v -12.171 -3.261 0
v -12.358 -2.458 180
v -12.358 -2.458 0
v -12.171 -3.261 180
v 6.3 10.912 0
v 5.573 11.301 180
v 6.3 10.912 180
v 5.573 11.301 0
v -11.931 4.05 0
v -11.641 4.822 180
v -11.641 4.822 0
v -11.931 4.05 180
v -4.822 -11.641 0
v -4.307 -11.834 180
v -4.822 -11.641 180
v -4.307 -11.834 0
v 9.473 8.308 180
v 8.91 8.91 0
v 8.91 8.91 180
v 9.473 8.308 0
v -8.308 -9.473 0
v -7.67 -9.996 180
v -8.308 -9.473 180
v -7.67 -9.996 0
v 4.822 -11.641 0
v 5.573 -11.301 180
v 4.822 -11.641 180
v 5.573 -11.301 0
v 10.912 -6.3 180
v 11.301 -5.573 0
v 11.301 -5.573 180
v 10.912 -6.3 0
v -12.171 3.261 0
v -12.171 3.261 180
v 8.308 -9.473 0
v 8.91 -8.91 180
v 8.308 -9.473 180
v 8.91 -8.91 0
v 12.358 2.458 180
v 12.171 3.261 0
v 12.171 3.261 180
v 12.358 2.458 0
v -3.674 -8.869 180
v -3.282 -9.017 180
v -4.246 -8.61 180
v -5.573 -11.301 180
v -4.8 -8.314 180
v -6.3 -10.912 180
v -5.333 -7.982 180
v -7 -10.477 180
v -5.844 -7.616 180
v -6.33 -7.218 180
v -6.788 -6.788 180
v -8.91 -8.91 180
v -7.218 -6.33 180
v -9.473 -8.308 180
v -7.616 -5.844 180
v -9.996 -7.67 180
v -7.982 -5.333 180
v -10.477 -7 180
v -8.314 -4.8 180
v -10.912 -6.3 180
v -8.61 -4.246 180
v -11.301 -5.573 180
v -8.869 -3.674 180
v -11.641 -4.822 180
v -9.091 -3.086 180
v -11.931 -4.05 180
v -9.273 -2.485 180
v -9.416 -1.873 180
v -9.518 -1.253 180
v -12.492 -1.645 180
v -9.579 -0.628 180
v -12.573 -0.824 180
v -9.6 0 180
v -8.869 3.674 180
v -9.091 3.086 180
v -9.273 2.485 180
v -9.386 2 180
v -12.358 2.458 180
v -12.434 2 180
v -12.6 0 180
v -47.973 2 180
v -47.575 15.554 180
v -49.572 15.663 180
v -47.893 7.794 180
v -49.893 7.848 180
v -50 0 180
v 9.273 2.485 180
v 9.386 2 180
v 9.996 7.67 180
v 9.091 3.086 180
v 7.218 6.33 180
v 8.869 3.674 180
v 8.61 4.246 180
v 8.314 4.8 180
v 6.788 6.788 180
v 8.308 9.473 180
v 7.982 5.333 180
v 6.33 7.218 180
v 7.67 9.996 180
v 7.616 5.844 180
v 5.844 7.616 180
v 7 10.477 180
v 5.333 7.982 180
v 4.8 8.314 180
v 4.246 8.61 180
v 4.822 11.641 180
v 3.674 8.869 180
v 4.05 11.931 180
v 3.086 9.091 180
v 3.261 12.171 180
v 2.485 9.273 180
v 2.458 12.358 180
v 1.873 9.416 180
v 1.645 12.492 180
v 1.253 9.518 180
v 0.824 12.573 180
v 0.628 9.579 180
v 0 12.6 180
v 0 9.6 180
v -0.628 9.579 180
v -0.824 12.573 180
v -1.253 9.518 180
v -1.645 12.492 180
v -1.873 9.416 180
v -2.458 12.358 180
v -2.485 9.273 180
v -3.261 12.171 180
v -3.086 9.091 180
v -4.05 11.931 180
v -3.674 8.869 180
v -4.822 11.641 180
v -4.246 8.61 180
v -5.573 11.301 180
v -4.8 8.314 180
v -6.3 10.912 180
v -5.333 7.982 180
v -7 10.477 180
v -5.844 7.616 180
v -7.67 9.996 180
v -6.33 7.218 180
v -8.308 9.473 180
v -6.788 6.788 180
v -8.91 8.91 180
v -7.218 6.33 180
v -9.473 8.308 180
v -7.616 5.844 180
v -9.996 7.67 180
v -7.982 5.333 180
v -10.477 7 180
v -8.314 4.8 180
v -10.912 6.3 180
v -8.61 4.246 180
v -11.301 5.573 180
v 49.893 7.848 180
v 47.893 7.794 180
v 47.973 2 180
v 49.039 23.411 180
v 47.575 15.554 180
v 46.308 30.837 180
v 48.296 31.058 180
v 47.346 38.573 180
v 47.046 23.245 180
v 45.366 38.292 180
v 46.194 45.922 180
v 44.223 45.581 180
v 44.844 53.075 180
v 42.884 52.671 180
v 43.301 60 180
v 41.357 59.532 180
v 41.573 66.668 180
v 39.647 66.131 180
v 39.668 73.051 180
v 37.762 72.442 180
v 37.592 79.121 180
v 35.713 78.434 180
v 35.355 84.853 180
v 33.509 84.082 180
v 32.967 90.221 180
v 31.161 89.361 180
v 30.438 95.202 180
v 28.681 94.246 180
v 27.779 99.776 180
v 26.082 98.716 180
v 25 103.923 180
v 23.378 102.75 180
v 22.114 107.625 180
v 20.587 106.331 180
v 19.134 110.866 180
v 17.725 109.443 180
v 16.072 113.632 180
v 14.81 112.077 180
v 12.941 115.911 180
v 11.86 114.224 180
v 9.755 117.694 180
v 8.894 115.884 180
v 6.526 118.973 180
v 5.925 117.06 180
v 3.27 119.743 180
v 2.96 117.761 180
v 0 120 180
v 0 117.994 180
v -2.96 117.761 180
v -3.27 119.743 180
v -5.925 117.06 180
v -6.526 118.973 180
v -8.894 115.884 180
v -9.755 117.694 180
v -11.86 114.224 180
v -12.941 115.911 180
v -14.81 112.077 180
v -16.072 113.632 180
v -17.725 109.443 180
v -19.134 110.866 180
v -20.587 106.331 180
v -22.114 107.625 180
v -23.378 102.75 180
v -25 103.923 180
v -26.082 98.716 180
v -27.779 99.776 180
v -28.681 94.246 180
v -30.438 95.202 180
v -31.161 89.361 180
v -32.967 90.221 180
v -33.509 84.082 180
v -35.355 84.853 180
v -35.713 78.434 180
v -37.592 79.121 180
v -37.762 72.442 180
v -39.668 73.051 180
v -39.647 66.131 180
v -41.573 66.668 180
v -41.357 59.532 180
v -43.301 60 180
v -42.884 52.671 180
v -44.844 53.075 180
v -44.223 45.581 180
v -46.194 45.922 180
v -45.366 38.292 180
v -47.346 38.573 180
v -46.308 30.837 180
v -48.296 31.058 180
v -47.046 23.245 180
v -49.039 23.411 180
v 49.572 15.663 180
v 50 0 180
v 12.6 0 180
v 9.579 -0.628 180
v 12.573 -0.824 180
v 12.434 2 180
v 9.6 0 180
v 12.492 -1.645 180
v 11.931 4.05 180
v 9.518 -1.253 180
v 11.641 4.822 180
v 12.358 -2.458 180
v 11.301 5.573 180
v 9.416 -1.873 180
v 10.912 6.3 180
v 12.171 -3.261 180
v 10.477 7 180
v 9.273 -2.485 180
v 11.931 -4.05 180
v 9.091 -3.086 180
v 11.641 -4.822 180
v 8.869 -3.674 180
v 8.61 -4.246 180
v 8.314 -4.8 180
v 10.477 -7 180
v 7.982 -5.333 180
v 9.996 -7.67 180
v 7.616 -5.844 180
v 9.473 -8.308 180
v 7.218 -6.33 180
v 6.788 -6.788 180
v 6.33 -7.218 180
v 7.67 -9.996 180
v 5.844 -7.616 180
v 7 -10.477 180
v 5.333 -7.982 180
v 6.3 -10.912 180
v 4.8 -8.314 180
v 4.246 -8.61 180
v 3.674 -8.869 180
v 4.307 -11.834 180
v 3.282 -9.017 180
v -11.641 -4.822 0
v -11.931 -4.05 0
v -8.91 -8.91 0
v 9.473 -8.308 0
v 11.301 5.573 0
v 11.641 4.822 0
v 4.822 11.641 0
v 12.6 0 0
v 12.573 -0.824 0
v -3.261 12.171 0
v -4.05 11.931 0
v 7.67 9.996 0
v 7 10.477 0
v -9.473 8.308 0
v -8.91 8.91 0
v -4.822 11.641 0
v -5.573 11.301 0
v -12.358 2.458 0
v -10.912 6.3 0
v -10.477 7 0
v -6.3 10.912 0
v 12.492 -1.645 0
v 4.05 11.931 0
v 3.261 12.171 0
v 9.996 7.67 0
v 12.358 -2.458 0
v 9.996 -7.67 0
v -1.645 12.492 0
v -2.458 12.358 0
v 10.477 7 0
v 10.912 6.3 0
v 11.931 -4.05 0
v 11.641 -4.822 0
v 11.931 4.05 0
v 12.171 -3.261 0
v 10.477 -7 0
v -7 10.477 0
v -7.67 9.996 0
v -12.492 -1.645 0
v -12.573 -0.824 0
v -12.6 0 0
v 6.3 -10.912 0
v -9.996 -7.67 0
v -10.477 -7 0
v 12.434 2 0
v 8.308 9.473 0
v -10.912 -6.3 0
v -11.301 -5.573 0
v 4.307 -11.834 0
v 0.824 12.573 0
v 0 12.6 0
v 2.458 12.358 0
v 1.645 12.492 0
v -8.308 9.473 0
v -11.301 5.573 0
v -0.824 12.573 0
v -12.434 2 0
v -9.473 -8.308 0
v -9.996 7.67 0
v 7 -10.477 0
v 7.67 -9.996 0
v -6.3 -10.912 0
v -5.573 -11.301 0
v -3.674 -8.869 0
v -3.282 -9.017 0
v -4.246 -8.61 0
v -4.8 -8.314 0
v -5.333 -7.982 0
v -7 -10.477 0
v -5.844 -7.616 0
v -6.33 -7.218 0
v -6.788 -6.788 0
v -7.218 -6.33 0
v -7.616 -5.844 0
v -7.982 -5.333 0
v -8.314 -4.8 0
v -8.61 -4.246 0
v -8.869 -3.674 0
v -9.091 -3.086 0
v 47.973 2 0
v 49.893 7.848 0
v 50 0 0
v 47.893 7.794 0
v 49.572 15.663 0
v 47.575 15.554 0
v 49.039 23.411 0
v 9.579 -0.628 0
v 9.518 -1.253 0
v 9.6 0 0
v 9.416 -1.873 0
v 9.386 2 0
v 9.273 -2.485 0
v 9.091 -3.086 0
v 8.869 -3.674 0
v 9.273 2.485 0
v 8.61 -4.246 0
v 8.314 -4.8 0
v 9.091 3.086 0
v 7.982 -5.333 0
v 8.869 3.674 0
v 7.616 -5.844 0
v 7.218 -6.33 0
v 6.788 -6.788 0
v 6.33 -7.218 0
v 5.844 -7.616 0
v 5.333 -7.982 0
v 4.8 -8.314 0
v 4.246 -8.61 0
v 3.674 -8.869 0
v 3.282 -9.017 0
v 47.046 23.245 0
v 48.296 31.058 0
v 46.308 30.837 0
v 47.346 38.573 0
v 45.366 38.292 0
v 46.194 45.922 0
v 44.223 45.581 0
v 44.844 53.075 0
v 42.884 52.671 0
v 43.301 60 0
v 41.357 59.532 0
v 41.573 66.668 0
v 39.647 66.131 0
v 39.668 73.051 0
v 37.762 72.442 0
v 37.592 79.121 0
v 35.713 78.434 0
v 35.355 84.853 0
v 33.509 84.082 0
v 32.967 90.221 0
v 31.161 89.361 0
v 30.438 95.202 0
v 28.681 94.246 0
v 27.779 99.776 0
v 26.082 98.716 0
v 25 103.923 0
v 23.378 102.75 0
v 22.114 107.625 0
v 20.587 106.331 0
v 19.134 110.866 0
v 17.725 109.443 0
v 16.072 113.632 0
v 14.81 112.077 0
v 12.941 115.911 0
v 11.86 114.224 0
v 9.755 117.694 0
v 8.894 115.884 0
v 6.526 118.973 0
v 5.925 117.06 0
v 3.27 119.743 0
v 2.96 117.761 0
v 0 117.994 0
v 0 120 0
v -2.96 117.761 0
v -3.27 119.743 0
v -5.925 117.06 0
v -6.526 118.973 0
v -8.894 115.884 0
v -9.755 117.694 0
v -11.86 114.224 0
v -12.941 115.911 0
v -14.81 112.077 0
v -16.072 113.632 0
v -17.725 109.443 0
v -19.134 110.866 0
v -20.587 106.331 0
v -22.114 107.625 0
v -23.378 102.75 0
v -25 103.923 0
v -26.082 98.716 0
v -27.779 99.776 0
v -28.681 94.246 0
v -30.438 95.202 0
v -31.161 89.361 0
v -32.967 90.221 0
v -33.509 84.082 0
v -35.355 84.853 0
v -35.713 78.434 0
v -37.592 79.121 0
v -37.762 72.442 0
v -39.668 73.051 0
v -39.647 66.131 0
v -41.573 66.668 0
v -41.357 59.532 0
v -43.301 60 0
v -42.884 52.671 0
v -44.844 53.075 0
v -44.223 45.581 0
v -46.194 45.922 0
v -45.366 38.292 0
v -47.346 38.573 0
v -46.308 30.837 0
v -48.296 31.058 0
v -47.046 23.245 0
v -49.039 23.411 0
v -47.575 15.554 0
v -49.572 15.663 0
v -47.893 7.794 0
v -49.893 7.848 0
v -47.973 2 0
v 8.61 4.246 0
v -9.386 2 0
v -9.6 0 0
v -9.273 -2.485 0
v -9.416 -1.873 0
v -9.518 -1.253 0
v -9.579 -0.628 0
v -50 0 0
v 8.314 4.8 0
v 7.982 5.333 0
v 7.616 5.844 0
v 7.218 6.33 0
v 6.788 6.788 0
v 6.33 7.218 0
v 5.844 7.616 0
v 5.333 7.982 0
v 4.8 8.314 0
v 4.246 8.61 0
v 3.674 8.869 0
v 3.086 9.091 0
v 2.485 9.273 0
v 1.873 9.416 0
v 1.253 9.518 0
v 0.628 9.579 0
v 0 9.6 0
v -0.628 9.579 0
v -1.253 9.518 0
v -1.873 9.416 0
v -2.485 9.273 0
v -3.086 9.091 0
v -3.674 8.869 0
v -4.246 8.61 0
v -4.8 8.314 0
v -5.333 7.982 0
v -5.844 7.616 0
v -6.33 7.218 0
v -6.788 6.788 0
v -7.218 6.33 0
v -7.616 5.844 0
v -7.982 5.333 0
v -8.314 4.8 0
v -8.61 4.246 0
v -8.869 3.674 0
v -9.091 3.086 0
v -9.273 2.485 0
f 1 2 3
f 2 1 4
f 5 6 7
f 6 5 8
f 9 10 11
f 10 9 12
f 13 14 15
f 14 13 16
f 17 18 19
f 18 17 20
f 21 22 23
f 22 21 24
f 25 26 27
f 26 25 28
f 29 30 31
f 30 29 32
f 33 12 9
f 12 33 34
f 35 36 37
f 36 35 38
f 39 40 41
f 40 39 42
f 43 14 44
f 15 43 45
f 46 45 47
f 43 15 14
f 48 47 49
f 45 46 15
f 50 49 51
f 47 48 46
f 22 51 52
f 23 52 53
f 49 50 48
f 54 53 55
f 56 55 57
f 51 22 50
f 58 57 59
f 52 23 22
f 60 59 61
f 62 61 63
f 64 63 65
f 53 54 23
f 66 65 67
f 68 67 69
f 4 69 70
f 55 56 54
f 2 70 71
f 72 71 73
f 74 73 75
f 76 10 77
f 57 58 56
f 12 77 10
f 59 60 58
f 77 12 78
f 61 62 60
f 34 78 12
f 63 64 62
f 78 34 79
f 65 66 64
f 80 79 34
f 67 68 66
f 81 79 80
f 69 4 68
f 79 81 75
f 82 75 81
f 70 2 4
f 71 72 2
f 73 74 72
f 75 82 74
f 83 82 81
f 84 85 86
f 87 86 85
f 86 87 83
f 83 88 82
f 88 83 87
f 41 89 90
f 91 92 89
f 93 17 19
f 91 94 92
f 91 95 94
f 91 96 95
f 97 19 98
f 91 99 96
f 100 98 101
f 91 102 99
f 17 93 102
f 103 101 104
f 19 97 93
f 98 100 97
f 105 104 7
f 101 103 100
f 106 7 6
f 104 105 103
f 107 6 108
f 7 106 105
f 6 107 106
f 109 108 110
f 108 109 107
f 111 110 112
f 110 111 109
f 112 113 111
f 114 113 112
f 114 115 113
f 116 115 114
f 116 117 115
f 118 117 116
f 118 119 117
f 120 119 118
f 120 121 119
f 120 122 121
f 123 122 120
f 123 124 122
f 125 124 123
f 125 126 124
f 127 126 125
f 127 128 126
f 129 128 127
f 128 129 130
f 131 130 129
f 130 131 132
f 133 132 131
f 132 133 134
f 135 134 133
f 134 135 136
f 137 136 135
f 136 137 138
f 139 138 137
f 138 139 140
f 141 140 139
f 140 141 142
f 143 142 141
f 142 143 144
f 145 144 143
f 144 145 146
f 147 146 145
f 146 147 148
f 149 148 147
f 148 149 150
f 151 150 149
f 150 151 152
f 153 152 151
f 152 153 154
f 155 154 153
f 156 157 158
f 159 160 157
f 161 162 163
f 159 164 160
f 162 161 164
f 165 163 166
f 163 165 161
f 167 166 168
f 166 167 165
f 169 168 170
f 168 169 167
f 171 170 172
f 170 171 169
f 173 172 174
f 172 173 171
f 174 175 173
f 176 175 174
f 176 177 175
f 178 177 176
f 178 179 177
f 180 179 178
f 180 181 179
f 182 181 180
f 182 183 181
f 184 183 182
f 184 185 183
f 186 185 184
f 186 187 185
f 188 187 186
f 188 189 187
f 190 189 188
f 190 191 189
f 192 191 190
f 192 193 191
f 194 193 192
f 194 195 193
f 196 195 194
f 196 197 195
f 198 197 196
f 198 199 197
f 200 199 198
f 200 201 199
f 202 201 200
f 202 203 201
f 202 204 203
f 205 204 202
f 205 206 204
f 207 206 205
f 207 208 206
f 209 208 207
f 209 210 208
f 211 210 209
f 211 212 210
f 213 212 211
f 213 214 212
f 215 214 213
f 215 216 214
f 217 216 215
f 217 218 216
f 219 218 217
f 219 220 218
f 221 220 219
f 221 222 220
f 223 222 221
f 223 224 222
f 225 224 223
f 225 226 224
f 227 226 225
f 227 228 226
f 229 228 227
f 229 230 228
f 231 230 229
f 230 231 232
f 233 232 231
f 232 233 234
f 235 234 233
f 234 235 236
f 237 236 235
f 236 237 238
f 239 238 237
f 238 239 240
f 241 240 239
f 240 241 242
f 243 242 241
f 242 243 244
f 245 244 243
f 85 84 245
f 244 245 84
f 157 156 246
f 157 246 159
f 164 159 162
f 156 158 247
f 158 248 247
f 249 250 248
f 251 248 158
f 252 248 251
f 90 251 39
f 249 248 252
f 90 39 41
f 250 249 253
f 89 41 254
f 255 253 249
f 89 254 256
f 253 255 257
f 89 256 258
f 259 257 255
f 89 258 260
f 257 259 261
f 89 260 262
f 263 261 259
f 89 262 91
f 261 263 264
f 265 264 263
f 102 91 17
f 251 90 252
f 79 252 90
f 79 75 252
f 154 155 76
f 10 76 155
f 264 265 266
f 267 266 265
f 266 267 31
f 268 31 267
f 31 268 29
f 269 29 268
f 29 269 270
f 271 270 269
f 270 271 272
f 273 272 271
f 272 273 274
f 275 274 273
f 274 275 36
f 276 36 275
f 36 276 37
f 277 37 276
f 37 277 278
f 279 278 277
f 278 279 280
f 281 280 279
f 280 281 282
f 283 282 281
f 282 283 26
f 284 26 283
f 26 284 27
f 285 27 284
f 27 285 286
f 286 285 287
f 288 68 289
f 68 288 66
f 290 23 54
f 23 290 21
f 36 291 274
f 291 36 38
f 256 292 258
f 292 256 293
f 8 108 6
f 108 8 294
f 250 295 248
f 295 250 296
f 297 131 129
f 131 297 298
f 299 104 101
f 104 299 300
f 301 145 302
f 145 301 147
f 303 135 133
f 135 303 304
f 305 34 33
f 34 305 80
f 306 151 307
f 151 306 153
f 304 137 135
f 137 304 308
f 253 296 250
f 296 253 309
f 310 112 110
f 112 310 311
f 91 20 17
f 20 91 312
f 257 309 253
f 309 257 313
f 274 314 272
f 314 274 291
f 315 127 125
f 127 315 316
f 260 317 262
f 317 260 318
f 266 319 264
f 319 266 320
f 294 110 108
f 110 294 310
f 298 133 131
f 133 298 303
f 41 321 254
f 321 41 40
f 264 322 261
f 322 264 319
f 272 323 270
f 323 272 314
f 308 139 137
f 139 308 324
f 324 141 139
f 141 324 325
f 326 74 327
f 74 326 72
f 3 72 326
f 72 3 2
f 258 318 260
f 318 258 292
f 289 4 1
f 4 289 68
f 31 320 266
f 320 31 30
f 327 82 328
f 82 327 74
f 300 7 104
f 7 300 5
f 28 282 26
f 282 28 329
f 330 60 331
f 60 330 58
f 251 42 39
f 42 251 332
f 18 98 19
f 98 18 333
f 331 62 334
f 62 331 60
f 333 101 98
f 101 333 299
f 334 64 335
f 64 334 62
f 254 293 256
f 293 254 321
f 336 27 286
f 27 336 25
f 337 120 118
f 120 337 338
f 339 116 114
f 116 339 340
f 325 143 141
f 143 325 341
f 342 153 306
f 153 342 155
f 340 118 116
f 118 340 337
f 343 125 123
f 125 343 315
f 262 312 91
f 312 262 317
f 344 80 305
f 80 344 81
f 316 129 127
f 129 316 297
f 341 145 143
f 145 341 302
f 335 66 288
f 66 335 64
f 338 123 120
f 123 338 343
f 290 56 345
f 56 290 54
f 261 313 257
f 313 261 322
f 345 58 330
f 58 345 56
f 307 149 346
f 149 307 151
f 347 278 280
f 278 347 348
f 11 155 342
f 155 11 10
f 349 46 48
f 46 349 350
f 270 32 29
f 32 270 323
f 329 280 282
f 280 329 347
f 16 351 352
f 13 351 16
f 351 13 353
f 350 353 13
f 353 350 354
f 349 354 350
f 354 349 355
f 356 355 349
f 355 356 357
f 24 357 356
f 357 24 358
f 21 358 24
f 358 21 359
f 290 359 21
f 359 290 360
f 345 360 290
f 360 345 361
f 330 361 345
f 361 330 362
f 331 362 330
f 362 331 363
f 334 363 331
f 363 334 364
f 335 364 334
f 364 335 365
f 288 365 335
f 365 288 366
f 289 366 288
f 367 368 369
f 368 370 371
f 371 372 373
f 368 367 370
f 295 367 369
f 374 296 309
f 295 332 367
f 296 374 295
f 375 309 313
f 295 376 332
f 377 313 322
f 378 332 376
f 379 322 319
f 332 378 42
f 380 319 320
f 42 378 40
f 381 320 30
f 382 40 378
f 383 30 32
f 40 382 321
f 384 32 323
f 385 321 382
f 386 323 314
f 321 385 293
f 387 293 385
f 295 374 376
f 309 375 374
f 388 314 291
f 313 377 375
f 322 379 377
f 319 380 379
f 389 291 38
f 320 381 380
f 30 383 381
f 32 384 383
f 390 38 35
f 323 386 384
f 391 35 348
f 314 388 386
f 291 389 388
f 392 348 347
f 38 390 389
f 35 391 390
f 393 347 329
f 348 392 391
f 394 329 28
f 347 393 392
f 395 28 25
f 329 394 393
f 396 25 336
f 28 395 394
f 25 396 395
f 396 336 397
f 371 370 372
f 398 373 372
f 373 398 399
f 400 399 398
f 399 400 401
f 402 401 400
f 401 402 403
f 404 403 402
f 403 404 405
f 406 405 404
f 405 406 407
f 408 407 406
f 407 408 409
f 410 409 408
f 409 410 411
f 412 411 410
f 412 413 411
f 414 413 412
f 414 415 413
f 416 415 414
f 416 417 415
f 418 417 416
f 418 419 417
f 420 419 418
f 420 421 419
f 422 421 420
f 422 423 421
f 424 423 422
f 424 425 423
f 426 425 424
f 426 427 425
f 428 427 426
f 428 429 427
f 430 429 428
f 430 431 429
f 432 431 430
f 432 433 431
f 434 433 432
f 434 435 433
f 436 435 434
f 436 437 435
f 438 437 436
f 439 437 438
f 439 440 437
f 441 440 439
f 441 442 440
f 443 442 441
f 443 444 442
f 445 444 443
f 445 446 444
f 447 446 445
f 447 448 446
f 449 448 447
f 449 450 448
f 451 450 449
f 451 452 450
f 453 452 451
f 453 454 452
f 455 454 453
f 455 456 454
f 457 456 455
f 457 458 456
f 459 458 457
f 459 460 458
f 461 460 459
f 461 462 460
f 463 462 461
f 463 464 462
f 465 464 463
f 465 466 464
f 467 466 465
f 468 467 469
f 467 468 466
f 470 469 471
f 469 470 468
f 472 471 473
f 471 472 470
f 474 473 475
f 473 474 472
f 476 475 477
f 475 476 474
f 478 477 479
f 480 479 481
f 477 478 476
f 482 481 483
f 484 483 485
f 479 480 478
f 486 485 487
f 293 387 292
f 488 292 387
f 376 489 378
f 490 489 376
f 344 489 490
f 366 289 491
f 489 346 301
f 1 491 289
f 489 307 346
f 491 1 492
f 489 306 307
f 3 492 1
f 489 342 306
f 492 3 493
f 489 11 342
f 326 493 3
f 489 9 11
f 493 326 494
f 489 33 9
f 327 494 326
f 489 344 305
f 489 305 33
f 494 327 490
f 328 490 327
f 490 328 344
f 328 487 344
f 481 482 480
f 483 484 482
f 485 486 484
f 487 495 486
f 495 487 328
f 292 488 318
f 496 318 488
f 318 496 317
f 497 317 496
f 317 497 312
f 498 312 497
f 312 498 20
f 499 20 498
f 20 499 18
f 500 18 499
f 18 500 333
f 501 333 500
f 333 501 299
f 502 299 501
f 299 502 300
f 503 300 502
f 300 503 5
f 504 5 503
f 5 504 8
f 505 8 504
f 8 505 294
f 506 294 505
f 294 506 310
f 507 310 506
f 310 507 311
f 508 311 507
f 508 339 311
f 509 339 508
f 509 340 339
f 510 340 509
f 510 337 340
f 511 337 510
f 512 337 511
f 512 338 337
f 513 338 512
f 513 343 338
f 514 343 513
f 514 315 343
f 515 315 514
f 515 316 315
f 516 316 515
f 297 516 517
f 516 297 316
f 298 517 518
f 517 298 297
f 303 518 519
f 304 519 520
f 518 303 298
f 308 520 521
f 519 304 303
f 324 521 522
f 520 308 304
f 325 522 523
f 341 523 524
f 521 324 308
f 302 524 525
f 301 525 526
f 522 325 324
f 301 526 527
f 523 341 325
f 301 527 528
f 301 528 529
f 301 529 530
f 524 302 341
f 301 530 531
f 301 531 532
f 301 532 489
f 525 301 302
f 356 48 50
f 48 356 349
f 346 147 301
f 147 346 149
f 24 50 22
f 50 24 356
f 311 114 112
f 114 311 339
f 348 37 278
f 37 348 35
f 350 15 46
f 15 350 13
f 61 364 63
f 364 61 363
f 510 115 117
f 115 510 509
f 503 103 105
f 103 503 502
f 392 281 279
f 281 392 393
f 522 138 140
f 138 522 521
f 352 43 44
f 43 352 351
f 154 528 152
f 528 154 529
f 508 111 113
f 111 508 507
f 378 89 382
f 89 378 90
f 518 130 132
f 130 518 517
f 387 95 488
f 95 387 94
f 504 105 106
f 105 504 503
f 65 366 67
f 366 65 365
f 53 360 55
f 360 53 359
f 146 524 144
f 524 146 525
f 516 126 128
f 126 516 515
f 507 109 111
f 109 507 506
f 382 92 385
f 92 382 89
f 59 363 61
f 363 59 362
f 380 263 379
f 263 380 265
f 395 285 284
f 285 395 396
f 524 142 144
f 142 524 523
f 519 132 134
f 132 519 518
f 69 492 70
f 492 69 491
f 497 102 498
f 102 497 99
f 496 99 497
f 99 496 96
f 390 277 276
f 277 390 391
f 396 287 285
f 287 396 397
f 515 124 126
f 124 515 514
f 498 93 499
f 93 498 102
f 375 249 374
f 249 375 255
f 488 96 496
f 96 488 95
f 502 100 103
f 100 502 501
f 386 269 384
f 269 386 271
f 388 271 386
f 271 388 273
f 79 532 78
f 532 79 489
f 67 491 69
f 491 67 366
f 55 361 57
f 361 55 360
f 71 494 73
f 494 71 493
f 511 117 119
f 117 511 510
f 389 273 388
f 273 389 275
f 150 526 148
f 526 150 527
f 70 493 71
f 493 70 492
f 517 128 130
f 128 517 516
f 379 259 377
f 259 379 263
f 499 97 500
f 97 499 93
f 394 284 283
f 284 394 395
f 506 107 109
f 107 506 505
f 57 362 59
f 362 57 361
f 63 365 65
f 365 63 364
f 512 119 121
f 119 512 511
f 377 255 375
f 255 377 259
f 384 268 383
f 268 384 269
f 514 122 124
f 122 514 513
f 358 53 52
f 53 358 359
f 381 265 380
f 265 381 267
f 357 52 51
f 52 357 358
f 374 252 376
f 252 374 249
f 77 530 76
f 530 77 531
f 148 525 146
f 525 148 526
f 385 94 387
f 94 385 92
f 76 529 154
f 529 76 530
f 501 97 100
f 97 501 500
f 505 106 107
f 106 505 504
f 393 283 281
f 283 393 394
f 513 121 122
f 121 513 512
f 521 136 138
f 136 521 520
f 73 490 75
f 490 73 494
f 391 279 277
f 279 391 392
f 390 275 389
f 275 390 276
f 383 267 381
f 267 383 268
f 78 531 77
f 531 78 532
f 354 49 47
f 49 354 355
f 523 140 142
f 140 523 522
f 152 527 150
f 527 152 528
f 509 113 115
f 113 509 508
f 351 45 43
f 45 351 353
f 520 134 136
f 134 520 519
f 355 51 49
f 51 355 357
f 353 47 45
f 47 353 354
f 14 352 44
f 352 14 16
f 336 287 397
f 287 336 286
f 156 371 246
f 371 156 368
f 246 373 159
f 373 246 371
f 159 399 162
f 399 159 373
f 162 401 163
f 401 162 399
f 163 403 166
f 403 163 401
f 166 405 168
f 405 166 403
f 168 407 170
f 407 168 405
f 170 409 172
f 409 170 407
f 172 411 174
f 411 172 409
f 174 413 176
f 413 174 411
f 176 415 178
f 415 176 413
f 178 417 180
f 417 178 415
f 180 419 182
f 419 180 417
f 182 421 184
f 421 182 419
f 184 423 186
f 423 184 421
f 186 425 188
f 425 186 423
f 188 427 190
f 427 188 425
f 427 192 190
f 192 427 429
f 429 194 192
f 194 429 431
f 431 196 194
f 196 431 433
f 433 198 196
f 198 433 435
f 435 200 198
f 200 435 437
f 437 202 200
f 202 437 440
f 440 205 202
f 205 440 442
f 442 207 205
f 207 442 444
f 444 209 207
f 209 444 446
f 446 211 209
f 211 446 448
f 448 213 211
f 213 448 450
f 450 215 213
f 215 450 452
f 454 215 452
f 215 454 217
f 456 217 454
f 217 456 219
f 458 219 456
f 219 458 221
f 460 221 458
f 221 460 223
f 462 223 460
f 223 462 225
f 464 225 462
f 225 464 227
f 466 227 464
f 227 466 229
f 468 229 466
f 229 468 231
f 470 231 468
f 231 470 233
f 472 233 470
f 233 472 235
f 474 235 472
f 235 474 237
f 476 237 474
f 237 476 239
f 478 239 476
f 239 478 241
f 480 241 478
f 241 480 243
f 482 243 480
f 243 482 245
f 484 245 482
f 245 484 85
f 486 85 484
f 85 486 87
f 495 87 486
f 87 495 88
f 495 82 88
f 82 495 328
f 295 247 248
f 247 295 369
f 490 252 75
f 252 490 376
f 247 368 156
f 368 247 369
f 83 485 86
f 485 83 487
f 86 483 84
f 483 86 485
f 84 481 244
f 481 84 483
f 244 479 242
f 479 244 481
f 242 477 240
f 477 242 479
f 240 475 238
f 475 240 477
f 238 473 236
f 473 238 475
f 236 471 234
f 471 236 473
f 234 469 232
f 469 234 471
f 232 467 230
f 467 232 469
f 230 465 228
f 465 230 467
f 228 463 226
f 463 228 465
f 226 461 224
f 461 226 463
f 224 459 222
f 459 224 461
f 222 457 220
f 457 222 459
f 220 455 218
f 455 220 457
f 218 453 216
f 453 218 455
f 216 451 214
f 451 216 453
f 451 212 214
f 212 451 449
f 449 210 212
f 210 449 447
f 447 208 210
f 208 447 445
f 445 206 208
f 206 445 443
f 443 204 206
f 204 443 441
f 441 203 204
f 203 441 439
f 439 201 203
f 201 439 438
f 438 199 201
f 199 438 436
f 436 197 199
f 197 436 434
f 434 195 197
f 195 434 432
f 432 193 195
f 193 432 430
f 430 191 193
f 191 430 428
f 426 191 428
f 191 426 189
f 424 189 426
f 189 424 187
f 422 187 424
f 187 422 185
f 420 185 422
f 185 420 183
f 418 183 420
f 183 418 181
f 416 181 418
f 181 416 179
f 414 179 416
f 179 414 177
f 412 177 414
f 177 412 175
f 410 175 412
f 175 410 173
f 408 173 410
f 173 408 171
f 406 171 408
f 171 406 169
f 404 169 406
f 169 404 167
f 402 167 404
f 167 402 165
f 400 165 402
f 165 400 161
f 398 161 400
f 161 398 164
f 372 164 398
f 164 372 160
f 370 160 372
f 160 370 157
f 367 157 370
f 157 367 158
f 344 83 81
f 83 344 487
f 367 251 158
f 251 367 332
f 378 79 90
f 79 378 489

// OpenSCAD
// Lampenschirm für Stehlampe – D-förmiger Querschnitt mit Klemmkragen
// Alle Maße in Millimetern (Regel: units-mm)
//
// Kontext: context/printer.md, context/tolerances.md und context/materials.md
// waren zum Zeitpunkt der Modellierung leer (siehe Regel: context-first).
// Folgende Annahmen wurden im Design-Dialog mit dem Nutzer geklärt:
//   - Baubett >= 200mm Z-Höhe vorhanden -> Schirm wird als ein Teil,
//     stehend, in voller Höhe gedruckt.
//   - Klemmkragen als offener Federclip (C-Ring): Innendurchmesser 0.8mm
//     unter Stangendurchmesser (19.2mm ID auf 20mm Stange) für Vorspannung.
//   - E14-Fassung wird separat an der Stange montiert; der Schirm ist reine
//     Abdeckung/Diffusor ohne Kabeldurchführung.
//   - Klemmkragen-Wandstärke bewusst dicker als die 2mm-Schirmwand gewählt
//     (Klemmkraft/Stabilität), da context/tolerances.md keine Vorgabe macht.
//     -> Vor dem Druck gegenrechnen/prüfen (qa-agent / geometry-check).

// ---- Parameter ----
shade_height = 180;   // Gesamthöhe des Schirms
shade_width  = 100;   // Breite entlang der flachen Rückseite (X)
shade_depth  = 120;   // Tiefe von Rückseite bis vorderster Wölbung (Y)
wall_t       = 2;     // Wandstärke Schirm (dünn für Lichtdurchlässigkeit)

rod_d      = 20;                 // Durchmesser der Metallstange
rod_r      = rod_d / 2;
clip_id    = 19.2;               // Innendurchmesser Klemmkragen (Vorspannung, ~0.8mm Untermaß)
clip_r_in  = clip_id / 2;
clip_wall  = 3;                  // Wandstärke Klemmkragen (dicker als Schirmwand, siehe oben)
clip_r_out = clip_r_in + clip_wall;
clip_gap_deg = 40;               // Öffnungswinkel des C-Rings (Montagespalt, zeigt nach hinten/-Y)

$fn = 96;

// D-förmiges 2D-Profil: flache Rückseite bei y=0 (Breite = shade_width),
// halbovale (elliptische) Vorderseite bis y=shade_depth
module shade_outline() {
    intersection() {
        scale([shade_width / 2, shade_depth, 1])
            circle(r = 1);
        translate([-shade_width, 0, 0])
            square([shade_width * 2, shade_depth + 1]);
    }
}

// Dünnwandige Hülle des Schirms, oben und unten offen (kein Deckel/Boden)
module shade_shell() {
    linear_extrude(height = shade_height)
        difference() {
            shade_outline();
            offset(delta = -wall_t)
                shade_outline();
        }
}

// Keilförmiger Ausschnitt für die Öffnung des C-Rings, zentriert auf Winkel 0
module pie_cut(radius, angle_deg, height) {
    a = angle_deg / 2;
    translate([0, 0, -height / 2])
        linear_extrude(height)
            polygon(points = [
                [0, 0],
                [radius * cos(a), radius * sin(a)],
                [radius * cos(-a), radius * sin(-a)]
            ]);
}

// Klemmkragen: offener C-Ring über volle Schirmhöhe, zentriert auf der
// flachen Rückseite (x=0, y=0), Öffnung zeigt nach -Y (von der Stange weg
// nach außen, damit die Stange seitlich eingeclipst werden kann)
module clamp_collar() {
    difference() {
        cylinder(r = clip_r_out, h = shade_height);
        translate([0, 0, -1])
            cylinder(r = clip_r_in, h = shade_height + 2);
        translate([0, 0, shade_height / 2])
            rotate([0, 0, 270])
                pie_cut(clip_r_out + 5, clip_gap_deg, shade_height + 2);
    }
}

union() {
    shade_shell();
    clamp_collar();
}
